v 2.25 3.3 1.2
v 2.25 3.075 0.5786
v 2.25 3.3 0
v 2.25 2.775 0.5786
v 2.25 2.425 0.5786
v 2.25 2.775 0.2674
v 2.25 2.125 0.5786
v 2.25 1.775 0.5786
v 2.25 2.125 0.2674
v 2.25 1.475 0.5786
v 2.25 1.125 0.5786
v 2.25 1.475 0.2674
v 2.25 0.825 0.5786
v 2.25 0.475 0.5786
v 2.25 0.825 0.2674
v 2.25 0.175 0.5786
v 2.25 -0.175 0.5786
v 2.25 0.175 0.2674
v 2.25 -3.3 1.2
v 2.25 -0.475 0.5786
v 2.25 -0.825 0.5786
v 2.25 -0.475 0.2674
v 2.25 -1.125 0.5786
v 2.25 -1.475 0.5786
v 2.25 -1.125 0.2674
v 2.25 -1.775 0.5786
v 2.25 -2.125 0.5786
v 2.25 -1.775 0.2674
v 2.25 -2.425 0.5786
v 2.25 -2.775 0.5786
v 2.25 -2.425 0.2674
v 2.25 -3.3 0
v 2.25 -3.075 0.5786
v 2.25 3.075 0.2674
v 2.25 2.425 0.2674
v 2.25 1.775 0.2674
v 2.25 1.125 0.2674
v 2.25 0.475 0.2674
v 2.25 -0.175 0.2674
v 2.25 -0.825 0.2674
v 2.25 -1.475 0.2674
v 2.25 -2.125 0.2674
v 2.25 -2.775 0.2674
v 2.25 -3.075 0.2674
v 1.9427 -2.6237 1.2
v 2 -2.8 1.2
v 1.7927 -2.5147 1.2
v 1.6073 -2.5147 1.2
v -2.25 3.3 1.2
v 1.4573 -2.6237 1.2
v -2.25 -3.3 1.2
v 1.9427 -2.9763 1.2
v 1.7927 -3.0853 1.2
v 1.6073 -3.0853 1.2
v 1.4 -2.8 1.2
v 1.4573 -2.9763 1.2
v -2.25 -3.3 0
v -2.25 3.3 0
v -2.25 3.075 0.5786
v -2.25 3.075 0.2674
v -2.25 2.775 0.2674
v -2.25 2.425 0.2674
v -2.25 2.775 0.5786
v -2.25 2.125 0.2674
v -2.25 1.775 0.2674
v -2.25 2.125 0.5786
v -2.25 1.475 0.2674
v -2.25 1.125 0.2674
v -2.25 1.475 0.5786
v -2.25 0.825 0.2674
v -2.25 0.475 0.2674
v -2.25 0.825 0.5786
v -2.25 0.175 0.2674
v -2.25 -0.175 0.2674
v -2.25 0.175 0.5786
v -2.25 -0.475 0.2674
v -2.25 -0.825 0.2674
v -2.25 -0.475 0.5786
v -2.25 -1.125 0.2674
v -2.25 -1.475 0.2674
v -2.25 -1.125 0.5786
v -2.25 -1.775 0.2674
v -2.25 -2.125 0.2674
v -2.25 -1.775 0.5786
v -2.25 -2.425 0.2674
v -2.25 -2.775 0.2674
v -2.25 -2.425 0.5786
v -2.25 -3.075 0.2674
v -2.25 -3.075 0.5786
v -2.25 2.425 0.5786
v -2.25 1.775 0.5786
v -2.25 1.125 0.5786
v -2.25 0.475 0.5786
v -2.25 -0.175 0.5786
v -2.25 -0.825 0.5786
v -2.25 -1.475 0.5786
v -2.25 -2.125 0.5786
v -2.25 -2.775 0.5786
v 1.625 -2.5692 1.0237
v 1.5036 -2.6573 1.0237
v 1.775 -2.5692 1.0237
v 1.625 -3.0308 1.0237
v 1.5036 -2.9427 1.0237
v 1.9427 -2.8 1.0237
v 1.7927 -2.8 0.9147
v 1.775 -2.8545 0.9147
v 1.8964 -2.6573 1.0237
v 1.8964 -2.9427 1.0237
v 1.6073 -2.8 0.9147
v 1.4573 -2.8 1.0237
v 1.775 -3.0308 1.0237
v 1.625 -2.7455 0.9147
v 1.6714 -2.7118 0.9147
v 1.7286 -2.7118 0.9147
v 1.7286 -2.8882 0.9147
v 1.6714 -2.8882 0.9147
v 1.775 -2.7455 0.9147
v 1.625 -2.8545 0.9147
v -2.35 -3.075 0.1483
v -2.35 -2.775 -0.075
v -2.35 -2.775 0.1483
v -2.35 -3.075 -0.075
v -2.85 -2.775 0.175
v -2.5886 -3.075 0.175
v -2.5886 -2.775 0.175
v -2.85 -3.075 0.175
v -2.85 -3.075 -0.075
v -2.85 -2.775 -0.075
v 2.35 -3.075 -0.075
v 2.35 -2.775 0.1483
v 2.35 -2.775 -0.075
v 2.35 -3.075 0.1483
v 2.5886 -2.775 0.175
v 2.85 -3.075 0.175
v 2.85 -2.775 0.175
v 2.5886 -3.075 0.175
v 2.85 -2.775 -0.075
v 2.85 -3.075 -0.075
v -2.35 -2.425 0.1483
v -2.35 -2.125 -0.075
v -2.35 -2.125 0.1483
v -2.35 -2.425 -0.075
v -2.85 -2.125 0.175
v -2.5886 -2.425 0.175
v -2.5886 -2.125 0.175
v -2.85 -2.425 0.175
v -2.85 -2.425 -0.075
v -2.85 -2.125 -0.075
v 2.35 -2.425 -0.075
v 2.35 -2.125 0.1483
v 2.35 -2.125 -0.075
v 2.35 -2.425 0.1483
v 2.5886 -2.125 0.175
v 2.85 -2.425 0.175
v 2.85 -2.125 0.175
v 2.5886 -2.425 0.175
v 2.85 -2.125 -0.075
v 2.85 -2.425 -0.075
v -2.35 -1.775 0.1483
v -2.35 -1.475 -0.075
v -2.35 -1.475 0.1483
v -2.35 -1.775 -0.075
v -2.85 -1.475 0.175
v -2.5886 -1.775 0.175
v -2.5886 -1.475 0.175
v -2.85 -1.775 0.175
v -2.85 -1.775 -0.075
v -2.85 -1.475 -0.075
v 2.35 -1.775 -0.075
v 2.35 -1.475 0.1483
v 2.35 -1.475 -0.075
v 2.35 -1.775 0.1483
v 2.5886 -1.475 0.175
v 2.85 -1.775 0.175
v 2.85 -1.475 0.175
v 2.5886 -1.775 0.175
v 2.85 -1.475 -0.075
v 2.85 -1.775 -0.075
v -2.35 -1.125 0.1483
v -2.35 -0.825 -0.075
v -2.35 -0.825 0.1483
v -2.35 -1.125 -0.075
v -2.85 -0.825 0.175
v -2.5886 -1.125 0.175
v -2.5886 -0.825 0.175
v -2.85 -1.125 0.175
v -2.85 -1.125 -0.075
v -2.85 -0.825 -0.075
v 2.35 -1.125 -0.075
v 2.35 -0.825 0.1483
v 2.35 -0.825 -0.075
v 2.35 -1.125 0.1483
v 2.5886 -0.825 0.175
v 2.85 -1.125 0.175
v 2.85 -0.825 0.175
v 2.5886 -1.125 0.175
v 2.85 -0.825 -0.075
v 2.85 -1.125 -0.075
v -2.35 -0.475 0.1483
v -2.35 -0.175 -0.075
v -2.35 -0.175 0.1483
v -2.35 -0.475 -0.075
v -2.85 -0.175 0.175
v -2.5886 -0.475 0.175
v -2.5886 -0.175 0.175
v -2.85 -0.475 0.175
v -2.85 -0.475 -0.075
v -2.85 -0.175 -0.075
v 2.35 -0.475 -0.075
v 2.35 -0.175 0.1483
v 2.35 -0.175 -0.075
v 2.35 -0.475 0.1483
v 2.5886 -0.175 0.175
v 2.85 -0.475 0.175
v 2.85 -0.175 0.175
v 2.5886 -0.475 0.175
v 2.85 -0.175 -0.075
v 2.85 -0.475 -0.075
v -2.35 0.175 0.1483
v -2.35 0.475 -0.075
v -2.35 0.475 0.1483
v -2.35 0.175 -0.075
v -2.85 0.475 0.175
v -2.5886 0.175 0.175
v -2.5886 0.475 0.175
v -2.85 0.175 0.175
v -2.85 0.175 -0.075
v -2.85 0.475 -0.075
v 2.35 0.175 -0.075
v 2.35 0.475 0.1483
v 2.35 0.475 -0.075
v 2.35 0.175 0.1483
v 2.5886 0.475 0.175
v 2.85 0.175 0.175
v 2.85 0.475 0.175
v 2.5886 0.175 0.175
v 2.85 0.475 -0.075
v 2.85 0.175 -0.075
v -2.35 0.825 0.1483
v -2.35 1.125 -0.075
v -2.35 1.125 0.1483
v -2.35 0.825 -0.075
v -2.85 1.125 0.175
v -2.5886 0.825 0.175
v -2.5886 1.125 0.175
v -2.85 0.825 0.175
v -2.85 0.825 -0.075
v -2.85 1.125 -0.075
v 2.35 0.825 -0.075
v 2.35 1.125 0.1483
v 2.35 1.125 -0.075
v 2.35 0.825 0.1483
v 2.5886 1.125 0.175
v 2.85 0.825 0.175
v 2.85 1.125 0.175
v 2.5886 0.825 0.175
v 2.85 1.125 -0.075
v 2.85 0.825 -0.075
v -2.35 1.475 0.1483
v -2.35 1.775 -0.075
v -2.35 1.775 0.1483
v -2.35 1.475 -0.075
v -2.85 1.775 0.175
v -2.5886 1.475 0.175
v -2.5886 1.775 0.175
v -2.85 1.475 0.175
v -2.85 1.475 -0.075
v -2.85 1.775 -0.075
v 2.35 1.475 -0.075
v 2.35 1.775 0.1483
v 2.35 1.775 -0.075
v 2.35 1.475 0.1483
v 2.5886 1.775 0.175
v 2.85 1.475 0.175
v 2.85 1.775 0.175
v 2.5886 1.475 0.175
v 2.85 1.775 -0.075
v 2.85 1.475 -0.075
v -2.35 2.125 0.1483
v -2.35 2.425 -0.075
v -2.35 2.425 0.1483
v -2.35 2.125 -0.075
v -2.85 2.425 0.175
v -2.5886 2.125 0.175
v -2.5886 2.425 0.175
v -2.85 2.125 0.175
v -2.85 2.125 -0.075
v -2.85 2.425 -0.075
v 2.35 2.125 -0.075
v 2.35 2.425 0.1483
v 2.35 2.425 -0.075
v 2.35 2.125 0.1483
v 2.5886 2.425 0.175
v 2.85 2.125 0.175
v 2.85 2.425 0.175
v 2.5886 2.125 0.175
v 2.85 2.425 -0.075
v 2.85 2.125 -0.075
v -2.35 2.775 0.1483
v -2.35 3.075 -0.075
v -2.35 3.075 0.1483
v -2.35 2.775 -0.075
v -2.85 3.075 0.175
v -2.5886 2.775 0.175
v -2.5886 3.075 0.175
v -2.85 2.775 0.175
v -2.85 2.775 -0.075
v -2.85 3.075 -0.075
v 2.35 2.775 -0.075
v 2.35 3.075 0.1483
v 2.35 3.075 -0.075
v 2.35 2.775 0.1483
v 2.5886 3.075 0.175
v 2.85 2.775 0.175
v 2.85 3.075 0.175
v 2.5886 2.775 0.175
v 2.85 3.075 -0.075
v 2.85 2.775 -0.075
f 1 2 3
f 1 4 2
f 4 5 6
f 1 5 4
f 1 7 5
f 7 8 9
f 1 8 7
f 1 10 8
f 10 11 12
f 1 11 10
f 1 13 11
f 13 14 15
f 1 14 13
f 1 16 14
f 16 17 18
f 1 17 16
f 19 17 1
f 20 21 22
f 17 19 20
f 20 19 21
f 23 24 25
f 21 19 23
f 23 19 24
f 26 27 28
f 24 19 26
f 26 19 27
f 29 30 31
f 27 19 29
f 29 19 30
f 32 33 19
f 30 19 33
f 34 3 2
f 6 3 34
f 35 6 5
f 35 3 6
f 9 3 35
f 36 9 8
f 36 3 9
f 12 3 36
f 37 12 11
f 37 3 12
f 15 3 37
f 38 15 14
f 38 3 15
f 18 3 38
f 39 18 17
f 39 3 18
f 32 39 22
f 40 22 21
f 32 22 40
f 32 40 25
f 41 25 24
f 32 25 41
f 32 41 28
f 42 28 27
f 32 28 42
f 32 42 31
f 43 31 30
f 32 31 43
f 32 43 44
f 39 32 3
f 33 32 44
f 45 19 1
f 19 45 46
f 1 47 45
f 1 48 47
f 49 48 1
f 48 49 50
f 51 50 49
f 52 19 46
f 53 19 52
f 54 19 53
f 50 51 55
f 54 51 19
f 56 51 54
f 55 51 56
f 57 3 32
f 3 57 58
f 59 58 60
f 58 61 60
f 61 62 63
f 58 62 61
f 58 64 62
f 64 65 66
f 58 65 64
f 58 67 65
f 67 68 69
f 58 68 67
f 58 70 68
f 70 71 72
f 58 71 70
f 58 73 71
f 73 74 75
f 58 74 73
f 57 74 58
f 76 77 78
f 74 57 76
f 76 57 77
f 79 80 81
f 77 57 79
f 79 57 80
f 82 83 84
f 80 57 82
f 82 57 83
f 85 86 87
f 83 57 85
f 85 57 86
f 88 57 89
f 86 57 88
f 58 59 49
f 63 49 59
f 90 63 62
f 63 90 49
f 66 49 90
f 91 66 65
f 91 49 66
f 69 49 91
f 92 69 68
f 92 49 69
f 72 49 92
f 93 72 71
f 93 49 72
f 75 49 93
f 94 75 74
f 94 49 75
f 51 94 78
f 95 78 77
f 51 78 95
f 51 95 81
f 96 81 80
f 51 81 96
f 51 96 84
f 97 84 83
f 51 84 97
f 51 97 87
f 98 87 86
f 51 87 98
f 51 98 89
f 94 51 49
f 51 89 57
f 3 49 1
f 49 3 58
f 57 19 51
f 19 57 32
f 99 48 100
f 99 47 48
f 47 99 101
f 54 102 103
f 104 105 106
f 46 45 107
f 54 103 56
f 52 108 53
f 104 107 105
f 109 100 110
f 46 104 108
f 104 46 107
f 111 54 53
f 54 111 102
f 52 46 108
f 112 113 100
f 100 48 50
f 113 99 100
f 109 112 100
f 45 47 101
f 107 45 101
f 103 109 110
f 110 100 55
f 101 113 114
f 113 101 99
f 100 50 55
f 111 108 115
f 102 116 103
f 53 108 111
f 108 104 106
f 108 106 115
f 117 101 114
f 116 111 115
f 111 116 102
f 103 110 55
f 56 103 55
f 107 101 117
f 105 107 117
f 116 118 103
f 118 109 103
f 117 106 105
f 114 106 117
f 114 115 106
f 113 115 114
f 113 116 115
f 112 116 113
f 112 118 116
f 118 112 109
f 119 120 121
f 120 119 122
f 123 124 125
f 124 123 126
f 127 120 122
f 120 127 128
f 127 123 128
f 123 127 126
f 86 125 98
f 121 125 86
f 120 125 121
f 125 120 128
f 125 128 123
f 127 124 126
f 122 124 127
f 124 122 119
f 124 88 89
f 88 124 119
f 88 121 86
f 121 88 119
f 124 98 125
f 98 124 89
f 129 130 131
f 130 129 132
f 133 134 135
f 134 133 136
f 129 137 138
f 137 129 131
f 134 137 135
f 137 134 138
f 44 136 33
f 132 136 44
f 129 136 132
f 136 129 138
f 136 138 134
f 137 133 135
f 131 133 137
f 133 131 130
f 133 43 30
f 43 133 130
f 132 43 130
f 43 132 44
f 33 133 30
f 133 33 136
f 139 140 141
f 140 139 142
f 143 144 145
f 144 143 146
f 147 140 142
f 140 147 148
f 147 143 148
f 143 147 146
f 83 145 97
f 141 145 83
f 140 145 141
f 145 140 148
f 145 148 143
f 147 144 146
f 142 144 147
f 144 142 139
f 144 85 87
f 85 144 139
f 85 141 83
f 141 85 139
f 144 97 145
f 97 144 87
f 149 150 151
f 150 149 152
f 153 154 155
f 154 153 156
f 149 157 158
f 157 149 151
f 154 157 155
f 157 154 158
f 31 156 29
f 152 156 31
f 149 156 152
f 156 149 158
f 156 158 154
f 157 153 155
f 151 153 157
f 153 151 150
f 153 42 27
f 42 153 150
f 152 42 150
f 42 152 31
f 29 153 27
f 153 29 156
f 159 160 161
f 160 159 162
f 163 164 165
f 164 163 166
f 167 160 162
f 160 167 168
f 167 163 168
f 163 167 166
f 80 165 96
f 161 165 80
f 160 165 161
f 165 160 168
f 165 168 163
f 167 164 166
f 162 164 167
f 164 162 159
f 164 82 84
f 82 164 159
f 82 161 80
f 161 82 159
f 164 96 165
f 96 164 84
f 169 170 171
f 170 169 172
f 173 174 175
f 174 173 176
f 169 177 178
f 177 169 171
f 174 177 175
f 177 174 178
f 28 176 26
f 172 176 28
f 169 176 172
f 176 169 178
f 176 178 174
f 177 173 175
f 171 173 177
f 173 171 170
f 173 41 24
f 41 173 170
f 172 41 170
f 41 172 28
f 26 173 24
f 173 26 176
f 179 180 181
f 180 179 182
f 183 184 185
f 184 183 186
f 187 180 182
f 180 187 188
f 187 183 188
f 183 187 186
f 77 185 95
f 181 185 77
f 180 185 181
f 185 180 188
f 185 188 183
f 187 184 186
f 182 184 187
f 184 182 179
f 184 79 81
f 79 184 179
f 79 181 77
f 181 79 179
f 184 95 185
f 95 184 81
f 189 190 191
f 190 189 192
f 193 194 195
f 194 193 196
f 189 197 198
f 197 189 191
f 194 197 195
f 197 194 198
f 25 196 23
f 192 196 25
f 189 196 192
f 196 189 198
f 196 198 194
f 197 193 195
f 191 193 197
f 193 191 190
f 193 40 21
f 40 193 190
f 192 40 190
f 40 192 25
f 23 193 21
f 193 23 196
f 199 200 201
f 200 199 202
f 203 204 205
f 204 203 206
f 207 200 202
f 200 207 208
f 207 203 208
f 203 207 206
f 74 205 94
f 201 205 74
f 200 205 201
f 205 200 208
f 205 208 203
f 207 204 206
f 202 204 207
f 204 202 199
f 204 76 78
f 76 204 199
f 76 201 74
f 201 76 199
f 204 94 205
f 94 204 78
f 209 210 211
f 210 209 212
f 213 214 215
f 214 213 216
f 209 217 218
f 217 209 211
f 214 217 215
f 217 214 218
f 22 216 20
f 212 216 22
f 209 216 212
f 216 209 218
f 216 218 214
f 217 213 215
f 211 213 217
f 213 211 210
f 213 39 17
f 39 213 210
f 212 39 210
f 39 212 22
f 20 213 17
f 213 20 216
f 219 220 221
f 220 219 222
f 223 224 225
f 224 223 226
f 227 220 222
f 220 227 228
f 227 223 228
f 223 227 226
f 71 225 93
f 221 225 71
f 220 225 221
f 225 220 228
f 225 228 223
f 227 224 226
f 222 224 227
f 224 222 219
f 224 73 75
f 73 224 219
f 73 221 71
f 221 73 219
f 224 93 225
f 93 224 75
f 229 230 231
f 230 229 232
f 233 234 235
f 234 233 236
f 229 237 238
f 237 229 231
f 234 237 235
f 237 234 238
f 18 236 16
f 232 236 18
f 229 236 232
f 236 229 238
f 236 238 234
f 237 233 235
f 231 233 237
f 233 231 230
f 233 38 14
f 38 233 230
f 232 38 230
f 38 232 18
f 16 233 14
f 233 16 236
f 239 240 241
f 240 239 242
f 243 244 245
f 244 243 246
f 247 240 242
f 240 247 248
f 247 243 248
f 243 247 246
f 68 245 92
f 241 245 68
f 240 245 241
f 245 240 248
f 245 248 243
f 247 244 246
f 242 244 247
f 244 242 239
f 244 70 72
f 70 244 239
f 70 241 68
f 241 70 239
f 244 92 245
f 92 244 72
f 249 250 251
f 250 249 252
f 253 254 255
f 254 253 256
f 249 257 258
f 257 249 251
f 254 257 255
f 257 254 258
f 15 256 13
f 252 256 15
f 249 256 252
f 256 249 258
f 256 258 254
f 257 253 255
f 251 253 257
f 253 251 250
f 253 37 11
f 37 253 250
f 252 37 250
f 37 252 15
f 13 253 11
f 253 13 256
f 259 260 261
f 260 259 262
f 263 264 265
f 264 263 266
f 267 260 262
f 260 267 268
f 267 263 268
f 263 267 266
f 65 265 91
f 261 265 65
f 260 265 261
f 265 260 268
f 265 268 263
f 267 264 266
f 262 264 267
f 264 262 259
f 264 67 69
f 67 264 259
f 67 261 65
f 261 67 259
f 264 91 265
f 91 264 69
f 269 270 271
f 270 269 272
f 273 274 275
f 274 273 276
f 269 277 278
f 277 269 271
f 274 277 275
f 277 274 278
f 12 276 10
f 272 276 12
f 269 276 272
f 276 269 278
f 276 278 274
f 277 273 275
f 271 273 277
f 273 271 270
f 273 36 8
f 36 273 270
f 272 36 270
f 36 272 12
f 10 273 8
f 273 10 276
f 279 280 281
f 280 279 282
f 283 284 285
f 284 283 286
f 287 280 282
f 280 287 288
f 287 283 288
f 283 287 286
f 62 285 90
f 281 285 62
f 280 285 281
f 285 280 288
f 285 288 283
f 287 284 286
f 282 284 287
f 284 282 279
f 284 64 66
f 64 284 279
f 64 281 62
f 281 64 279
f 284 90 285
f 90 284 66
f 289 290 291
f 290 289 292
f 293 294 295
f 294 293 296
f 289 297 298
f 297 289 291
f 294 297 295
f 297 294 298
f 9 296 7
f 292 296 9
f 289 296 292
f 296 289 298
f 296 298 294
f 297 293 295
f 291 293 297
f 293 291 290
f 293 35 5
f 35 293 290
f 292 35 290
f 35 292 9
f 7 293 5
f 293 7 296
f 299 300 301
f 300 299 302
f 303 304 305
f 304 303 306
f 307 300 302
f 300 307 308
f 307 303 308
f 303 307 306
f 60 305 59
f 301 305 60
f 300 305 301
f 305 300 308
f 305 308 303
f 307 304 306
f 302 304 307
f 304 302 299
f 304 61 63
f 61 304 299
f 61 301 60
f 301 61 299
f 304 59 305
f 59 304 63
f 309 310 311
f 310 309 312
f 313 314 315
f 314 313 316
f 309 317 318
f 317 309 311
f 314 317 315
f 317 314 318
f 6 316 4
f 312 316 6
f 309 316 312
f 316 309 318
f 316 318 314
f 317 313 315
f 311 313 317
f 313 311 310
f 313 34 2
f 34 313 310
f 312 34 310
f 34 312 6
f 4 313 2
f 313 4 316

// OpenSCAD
/*
 * A generic SOP 4.5mm wide, 6.6mm long, 0.65mm pitch packaged part.
 *
 * Author: Ian McInerney
 * Created: July 16, 2015
 *
 */

module pin() {
	translate([0,0.0,0.0])cube([0.5,0.3,0.25], center=true);
	translate([0.23,0.0,0.23])rotate([0.0,40,0.0])translate([0.0,0.0,0.0])cube([0.2,0.3,0.7], center=true);
}


// Assemble the main package and the pins
module main() {
		translate([0.0,0.0,1.20/2])cube([4.5,6.60,1.20], center=true);
}

// Add the marker for pin 1
difference() {
	// The main cube
	main();

	// The pin 1 marker
	translate([1.7,-2.8,1.20])sphere(r=0.3, $fn=10);
}

// Create the pins
for ( i = [-2.925 : 0.65 : 2.925] )
{
    translate([-2.6,i,0.05])pin();
	 translate([2.6,i,0.05])rotate([0.0,0.0,180])pin();
}
